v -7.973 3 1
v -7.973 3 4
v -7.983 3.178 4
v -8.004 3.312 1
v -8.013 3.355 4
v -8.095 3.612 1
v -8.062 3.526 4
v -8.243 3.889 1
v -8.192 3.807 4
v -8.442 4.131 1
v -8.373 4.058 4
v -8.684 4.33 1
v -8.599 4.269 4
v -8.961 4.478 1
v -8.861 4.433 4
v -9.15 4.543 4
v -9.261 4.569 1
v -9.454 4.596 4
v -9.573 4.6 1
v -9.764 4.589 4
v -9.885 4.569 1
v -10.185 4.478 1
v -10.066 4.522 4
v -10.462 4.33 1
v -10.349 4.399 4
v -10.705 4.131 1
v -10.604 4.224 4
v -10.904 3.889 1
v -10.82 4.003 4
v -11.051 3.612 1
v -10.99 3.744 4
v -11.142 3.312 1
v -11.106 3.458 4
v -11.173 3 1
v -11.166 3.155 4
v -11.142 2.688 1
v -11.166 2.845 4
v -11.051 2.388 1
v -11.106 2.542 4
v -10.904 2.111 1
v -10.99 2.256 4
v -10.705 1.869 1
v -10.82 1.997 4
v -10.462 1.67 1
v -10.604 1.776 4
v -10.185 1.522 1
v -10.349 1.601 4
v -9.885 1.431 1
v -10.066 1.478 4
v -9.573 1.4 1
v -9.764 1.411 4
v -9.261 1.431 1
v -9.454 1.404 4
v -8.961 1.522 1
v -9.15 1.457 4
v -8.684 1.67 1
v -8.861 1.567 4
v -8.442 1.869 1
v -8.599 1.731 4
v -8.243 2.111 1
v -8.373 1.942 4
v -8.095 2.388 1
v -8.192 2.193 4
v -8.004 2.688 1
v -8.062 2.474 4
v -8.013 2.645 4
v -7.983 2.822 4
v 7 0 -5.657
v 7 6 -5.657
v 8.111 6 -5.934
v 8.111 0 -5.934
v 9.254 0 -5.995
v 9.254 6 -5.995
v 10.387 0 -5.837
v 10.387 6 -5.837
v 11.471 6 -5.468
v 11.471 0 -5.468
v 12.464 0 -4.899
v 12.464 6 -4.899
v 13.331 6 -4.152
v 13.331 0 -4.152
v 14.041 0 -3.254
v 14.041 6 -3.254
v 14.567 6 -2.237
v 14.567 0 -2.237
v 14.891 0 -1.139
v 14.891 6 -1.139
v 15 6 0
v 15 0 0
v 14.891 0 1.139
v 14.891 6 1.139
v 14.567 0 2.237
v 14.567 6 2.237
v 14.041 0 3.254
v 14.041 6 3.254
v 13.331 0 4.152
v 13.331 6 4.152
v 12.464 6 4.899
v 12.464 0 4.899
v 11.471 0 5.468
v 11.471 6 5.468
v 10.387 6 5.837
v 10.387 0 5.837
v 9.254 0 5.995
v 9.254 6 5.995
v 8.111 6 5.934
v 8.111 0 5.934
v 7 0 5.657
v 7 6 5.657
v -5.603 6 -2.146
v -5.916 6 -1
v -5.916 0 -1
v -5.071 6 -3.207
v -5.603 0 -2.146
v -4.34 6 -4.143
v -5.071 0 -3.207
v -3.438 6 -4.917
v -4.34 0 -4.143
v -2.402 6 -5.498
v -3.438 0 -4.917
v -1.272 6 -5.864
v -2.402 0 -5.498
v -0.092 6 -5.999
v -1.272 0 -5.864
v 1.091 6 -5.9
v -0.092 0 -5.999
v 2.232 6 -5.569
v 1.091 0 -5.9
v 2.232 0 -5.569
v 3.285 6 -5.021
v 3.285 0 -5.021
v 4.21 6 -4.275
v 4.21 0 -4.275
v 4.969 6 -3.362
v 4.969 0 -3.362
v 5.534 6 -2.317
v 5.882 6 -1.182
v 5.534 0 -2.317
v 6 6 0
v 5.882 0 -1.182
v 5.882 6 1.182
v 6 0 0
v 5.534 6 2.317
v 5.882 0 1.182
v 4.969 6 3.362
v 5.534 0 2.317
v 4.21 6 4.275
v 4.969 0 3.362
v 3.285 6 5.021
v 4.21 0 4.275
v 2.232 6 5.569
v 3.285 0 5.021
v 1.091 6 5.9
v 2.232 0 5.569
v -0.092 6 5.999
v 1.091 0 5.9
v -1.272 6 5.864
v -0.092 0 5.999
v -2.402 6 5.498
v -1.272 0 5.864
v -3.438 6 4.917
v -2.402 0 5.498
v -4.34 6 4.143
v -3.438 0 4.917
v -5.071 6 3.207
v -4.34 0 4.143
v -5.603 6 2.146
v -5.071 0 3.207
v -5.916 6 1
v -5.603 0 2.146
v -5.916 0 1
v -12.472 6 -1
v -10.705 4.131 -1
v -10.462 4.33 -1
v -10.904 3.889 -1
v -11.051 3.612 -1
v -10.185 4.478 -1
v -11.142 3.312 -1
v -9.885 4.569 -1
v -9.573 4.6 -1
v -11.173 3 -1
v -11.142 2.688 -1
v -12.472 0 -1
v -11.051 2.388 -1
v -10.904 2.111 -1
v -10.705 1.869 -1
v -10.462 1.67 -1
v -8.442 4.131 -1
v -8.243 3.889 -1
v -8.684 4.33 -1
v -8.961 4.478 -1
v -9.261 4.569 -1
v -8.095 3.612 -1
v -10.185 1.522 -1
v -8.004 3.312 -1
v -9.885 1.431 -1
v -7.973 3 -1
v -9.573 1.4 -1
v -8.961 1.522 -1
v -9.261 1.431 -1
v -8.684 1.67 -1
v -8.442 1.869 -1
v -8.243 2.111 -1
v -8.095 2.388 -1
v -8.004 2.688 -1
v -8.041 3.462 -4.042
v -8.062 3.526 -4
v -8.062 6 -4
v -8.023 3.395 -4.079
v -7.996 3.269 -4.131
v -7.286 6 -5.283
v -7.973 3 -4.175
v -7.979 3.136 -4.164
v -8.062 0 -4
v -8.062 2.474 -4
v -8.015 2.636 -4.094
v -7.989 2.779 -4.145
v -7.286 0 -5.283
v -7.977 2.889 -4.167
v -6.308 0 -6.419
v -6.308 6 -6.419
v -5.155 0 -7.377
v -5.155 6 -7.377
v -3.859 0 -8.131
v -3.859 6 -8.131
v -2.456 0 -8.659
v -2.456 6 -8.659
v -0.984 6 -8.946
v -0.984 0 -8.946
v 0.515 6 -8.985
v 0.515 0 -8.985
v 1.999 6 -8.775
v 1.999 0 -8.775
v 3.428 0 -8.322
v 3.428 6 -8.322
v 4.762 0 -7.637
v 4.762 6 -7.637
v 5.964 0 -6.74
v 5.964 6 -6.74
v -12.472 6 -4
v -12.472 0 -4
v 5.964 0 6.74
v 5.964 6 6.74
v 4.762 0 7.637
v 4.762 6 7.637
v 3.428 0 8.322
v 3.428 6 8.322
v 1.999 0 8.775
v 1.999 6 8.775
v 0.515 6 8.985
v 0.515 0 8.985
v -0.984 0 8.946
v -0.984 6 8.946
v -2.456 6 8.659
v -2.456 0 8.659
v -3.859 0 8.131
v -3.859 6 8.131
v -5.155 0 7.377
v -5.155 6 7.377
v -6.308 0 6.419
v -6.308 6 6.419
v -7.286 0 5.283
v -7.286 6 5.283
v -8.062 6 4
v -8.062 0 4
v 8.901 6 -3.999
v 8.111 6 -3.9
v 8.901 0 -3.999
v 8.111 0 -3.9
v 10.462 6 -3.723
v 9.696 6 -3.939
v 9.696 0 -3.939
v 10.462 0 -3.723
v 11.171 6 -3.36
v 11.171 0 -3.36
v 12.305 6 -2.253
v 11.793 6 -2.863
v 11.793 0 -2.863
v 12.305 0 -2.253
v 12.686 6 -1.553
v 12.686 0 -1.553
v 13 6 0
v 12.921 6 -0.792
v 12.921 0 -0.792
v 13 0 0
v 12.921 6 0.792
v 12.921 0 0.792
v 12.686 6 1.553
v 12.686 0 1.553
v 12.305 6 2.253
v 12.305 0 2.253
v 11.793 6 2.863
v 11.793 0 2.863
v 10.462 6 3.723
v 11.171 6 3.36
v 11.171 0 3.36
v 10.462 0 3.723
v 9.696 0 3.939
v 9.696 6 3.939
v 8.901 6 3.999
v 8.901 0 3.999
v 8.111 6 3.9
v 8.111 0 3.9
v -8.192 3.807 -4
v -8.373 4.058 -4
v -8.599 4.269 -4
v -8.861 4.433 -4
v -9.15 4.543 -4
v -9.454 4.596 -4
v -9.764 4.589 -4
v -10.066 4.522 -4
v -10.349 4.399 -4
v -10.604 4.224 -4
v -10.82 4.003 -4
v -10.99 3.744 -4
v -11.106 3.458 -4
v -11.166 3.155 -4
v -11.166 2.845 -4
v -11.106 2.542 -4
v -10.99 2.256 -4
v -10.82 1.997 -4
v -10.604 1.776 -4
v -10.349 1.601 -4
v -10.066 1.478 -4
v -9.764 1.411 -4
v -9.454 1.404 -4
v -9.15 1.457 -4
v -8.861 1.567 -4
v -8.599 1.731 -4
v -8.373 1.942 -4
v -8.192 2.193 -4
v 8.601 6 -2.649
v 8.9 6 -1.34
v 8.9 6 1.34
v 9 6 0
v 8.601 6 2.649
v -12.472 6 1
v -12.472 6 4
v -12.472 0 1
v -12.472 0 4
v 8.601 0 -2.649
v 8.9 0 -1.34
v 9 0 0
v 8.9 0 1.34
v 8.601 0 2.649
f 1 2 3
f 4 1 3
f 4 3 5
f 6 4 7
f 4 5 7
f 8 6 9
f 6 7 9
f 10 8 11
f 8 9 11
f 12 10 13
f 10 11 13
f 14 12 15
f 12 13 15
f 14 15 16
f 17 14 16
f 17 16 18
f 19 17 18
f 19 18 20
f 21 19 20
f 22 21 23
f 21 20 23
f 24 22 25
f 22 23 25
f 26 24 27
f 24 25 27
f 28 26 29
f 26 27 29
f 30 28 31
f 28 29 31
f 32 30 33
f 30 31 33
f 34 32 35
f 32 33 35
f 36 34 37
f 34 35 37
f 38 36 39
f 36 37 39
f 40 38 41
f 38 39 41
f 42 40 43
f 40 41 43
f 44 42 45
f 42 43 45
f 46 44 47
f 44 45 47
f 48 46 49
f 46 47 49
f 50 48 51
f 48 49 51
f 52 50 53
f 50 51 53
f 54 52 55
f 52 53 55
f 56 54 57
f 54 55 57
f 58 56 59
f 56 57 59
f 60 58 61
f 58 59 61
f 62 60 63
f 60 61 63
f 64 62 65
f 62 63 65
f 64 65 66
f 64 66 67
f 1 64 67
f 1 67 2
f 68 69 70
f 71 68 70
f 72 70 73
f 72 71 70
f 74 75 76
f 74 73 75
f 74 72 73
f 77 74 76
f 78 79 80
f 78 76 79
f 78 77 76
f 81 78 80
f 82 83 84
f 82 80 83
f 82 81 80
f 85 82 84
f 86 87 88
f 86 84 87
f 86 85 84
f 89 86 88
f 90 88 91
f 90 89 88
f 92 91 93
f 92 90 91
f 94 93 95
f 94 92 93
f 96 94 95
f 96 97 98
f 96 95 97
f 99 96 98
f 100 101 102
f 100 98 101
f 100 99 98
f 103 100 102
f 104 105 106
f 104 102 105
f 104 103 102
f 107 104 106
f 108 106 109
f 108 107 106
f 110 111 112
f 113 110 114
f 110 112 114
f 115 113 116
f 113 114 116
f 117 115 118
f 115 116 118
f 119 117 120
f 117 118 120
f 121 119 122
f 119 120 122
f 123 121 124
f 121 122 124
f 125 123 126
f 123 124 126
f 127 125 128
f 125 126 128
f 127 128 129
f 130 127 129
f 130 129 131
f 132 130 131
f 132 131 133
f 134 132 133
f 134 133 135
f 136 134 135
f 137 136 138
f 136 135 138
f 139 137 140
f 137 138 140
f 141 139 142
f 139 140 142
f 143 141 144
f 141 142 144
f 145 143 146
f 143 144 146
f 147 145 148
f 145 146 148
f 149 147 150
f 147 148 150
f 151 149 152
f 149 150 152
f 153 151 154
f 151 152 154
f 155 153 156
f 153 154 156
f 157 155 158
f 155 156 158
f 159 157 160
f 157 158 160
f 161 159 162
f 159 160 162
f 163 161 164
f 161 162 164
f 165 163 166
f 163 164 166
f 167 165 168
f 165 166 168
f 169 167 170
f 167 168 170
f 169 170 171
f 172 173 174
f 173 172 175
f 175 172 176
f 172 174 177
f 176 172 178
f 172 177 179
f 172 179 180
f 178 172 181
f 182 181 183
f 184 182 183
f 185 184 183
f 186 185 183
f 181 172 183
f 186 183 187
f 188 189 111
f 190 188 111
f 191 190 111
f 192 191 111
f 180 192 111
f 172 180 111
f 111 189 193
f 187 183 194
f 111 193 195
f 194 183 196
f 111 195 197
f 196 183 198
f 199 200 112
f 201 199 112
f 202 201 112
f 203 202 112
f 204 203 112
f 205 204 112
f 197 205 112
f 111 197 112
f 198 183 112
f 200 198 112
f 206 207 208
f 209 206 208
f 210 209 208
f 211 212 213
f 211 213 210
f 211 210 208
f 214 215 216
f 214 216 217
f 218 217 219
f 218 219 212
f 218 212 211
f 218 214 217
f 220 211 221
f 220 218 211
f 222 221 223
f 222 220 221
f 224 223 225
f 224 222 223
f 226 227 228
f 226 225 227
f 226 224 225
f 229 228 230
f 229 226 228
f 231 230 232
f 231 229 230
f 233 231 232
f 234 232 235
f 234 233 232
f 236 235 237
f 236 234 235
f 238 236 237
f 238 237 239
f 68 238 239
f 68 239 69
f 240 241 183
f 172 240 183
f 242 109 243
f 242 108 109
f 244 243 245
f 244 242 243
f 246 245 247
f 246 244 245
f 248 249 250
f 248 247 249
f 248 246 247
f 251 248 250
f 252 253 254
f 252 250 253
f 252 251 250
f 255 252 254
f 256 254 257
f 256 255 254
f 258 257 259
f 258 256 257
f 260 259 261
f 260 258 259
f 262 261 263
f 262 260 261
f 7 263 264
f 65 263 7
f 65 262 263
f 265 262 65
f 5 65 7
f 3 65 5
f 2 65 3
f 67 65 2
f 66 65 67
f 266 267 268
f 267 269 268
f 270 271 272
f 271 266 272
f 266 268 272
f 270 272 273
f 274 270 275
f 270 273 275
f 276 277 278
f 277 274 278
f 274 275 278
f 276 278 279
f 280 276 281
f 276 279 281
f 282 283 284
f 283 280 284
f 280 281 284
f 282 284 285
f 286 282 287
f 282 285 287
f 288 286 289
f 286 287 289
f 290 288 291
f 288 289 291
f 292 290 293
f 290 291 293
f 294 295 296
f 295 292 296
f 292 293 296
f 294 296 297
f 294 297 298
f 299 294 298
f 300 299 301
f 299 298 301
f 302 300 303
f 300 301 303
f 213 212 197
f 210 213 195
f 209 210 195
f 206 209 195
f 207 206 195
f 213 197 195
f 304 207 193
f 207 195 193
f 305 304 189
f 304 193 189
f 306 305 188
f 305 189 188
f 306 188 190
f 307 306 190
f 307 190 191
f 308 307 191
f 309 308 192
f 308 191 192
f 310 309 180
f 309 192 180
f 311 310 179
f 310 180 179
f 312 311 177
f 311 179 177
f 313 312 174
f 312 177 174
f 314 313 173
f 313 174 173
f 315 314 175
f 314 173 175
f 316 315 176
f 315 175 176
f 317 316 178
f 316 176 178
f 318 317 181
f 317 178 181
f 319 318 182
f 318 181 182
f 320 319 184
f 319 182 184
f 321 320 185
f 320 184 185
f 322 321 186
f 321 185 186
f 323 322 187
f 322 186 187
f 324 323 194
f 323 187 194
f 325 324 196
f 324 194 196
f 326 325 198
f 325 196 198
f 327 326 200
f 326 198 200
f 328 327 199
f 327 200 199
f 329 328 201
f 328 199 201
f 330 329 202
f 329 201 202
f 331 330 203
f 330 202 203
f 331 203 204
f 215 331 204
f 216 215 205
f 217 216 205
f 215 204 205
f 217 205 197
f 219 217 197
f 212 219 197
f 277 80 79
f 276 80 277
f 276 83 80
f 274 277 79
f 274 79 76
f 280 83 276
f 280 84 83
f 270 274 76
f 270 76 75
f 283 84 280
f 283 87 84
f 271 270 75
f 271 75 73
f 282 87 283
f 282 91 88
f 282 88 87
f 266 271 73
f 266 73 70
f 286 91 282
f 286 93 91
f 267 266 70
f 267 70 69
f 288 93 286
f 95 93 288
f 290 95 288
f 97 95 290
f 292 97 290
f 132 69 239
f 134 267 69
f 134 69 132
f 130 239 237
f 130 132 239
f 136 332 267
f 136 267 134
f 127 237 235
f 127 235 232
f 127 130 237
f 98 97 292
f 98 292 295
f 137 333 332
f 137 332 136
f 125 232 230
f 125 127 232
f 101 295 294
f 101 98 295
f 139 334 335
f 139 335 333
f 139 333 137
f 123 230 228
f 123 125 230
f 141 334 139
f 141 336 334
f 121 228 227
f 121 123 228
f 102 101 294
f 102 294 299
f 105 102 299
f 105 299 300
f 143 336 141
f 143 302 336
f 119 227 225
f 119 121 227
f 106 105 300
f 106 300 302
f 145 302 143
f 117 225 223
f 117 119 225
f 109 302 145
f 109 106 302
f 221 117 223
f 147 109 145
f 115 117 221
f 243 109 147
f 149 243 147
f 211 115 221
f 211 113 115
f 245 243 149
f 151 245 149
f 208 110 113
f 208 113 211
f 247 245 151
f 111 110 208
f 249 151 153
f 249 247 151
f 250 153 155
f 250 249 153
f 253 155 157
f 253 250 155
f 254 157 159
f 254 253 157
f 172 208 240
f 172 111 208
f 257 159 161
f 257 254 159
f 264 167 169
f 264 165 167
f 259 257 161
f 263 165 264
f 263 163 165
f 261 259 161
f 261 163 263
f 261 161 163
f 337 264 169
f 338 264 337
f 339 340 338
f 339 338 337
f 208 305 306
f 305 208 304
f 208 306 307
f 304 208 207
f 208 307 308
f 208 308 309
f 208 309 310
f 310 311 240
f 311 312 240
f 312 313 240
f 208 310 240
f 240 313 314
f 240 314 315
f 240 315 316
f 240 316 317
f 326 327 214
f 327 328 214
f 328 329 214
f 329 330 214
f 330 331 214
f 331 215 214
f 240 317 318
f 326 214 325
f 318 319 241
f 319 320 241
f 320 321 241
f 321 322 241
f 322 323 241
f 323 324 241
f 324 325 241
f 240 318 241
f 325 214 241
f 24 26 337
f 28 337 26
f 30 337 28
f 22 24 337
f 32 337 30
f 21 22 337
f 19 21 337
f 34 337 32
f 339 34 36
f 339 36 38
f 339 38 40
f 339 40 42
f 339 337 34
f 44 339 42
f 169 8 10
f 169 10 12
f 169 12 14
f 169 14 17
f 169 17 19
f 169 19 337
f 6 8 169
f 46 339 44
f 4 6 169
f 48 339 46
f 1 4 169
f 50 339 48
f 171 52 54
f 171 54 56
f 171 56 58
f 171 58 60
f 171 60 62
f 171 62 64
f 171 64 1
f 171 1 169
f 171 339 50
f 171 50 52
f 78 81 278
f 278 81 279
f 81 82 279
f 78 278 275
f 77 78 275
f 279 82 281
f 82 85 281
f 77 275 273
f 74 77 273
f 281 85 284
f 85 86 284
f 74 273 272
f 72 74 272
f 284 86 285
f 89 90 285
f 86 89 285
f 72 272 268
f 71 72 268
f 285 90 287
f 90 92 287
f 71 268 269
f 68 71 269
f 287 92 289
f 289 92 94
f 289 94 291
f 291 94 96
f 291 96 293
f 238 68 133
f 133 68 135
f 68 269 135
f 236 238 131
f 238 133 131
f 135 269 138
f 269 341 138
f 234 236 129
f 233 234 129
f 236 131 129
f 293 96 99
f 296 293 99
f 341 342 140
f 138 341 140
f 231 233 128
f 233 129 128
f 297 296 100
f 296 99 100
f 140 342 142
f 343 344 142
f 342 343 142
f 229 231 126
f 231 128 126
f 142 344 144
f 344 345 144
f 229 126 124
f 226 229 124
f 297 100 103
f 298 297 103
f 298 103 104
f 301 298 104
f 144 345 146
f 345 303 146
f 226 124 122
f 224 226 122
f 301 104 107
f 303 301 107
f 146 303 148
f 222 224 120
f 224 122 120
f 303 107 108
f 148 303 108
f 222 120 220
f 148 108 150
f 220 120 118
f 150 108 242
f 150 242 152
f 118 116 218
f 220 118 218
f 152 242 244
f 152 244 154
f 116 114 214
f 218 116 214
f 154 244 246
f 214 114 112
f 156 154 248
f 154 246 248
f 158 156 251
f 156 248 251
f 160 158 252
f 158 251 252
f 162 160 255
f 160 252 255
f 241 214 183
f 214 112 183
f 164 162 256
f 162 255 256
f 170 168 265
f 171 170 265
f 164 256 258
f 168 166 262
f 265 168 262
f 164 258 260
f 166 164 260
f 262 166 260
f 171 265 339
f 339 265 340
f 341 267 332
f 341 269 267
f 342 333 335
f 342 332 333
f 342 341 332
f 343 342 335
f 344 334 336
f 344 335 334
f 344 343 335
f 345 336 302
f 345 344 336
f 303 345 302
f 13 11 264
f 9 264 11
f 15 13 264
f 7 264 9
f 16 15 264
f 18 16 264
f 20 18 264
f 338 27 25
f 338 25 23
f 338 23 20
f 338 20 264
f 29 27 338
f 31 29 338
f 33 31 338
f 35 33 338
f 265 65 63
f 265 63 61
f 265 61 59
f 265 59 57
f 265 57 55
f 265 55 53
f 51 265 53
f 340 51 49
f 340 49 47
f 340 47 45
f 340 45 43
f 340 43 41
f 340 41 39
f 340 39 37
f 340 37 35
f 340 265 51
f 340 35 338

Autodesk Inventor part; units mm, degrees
ref_plane "YZ Plane" through (0, 0, 0) normal (1, 0, 0) x (0, 1, 0)
ref_plane "XZ Plane" through (0, 0, 0) normal (0, 1, 0) x (-1, 0, 0)
ref_plane "XY Plane" through (0, 0, 0) normal (0, 0, 1) x (1, 0, 0)
sketch "Sketch1" plane through (0, 0, 0) normal (0, 1, 0) x (-1, 0, 0)
  circle A0 centre (0, 0) radius 6
  circle A1 centre (0, 0) radius 9
  line L0 (4.4721, 4) -> (12.4721, 4)
  line L1 (12.4721, 4) -> (12.4721, 1)
  line L2 (12.4721, 1) -> (4.4721, 1)
  line L3 (4.4721, 1) -> (4.4721, 4)
  line L4 (4.4721, -4) -> (12.4721, -4)
  line L5 (12.4721, -4) -> (12.4721, -1)
  line L6 (12.4721, -1) -> (4.4721, -1)
  line L7 (4.4721, -1) -> (4.4721, -4)
  circle A2 centre (-9, 0) radius 4
  circle A3 centre (-9, 0) radius 6
  point P0 (-8.1111, -3.9)
  point P1 (-8.1111, 3.9)
  point P2 (5.9161, 1)
  point P3 (8.0623, 4)
  point P4 (-7, 5.6569)
  point P5 (-7, -5.6569)
  point P6 (8.0623, -4)
  point P7 (5.9161, -1)
  dimension "d0" = 12
  dimension "d1" = 3
  dimension "d2" = 3
  dimension "d3" = 3
  dimension "d4" = 1
  dimension "d5" = 1
  dimension "d6" = 8
  dimension "d7" = 8
  dimension "d8" = 8
  dimension "d9" = 2
extrude "Extrusion1" add sketch "Sketch1" along normal blind 6 contours A0 L0 A1 L2 | L6 A1 L4 A0 | A0 A3 A1 L0 | A1 L0 L1 L2 | L4 A1 A3 A0 | L6 L5 L4 A1 | A0 A2 A1 A3 | A3 A1 A2 A0 | A0 A2 A1 | A1 A2 A3
sketch "Sketch2" plane through (-12.4721, 0, 4) normal (0, 0, 1) x (1, 0, 0)
  line L0 (0, 0) -> (4.4099, 0) projected
  line L1 (4.4099, 0) -> (4.4099, 6) projected
  line L2 (0, 6) -> (4.4099, 6) projected
  line L3 (0, 0) -> (0, 6) projected
  circle A0 centre (2.8989, 3) radius 1.6
  point P0 (12.4721, 0)
  dimension "d12" = 3.2
extrude "Extrusion2" cut sketch "Sketch2" against normal blind 10 contours A0 L1 | L1 A0
properties part number "Spring_hook"
